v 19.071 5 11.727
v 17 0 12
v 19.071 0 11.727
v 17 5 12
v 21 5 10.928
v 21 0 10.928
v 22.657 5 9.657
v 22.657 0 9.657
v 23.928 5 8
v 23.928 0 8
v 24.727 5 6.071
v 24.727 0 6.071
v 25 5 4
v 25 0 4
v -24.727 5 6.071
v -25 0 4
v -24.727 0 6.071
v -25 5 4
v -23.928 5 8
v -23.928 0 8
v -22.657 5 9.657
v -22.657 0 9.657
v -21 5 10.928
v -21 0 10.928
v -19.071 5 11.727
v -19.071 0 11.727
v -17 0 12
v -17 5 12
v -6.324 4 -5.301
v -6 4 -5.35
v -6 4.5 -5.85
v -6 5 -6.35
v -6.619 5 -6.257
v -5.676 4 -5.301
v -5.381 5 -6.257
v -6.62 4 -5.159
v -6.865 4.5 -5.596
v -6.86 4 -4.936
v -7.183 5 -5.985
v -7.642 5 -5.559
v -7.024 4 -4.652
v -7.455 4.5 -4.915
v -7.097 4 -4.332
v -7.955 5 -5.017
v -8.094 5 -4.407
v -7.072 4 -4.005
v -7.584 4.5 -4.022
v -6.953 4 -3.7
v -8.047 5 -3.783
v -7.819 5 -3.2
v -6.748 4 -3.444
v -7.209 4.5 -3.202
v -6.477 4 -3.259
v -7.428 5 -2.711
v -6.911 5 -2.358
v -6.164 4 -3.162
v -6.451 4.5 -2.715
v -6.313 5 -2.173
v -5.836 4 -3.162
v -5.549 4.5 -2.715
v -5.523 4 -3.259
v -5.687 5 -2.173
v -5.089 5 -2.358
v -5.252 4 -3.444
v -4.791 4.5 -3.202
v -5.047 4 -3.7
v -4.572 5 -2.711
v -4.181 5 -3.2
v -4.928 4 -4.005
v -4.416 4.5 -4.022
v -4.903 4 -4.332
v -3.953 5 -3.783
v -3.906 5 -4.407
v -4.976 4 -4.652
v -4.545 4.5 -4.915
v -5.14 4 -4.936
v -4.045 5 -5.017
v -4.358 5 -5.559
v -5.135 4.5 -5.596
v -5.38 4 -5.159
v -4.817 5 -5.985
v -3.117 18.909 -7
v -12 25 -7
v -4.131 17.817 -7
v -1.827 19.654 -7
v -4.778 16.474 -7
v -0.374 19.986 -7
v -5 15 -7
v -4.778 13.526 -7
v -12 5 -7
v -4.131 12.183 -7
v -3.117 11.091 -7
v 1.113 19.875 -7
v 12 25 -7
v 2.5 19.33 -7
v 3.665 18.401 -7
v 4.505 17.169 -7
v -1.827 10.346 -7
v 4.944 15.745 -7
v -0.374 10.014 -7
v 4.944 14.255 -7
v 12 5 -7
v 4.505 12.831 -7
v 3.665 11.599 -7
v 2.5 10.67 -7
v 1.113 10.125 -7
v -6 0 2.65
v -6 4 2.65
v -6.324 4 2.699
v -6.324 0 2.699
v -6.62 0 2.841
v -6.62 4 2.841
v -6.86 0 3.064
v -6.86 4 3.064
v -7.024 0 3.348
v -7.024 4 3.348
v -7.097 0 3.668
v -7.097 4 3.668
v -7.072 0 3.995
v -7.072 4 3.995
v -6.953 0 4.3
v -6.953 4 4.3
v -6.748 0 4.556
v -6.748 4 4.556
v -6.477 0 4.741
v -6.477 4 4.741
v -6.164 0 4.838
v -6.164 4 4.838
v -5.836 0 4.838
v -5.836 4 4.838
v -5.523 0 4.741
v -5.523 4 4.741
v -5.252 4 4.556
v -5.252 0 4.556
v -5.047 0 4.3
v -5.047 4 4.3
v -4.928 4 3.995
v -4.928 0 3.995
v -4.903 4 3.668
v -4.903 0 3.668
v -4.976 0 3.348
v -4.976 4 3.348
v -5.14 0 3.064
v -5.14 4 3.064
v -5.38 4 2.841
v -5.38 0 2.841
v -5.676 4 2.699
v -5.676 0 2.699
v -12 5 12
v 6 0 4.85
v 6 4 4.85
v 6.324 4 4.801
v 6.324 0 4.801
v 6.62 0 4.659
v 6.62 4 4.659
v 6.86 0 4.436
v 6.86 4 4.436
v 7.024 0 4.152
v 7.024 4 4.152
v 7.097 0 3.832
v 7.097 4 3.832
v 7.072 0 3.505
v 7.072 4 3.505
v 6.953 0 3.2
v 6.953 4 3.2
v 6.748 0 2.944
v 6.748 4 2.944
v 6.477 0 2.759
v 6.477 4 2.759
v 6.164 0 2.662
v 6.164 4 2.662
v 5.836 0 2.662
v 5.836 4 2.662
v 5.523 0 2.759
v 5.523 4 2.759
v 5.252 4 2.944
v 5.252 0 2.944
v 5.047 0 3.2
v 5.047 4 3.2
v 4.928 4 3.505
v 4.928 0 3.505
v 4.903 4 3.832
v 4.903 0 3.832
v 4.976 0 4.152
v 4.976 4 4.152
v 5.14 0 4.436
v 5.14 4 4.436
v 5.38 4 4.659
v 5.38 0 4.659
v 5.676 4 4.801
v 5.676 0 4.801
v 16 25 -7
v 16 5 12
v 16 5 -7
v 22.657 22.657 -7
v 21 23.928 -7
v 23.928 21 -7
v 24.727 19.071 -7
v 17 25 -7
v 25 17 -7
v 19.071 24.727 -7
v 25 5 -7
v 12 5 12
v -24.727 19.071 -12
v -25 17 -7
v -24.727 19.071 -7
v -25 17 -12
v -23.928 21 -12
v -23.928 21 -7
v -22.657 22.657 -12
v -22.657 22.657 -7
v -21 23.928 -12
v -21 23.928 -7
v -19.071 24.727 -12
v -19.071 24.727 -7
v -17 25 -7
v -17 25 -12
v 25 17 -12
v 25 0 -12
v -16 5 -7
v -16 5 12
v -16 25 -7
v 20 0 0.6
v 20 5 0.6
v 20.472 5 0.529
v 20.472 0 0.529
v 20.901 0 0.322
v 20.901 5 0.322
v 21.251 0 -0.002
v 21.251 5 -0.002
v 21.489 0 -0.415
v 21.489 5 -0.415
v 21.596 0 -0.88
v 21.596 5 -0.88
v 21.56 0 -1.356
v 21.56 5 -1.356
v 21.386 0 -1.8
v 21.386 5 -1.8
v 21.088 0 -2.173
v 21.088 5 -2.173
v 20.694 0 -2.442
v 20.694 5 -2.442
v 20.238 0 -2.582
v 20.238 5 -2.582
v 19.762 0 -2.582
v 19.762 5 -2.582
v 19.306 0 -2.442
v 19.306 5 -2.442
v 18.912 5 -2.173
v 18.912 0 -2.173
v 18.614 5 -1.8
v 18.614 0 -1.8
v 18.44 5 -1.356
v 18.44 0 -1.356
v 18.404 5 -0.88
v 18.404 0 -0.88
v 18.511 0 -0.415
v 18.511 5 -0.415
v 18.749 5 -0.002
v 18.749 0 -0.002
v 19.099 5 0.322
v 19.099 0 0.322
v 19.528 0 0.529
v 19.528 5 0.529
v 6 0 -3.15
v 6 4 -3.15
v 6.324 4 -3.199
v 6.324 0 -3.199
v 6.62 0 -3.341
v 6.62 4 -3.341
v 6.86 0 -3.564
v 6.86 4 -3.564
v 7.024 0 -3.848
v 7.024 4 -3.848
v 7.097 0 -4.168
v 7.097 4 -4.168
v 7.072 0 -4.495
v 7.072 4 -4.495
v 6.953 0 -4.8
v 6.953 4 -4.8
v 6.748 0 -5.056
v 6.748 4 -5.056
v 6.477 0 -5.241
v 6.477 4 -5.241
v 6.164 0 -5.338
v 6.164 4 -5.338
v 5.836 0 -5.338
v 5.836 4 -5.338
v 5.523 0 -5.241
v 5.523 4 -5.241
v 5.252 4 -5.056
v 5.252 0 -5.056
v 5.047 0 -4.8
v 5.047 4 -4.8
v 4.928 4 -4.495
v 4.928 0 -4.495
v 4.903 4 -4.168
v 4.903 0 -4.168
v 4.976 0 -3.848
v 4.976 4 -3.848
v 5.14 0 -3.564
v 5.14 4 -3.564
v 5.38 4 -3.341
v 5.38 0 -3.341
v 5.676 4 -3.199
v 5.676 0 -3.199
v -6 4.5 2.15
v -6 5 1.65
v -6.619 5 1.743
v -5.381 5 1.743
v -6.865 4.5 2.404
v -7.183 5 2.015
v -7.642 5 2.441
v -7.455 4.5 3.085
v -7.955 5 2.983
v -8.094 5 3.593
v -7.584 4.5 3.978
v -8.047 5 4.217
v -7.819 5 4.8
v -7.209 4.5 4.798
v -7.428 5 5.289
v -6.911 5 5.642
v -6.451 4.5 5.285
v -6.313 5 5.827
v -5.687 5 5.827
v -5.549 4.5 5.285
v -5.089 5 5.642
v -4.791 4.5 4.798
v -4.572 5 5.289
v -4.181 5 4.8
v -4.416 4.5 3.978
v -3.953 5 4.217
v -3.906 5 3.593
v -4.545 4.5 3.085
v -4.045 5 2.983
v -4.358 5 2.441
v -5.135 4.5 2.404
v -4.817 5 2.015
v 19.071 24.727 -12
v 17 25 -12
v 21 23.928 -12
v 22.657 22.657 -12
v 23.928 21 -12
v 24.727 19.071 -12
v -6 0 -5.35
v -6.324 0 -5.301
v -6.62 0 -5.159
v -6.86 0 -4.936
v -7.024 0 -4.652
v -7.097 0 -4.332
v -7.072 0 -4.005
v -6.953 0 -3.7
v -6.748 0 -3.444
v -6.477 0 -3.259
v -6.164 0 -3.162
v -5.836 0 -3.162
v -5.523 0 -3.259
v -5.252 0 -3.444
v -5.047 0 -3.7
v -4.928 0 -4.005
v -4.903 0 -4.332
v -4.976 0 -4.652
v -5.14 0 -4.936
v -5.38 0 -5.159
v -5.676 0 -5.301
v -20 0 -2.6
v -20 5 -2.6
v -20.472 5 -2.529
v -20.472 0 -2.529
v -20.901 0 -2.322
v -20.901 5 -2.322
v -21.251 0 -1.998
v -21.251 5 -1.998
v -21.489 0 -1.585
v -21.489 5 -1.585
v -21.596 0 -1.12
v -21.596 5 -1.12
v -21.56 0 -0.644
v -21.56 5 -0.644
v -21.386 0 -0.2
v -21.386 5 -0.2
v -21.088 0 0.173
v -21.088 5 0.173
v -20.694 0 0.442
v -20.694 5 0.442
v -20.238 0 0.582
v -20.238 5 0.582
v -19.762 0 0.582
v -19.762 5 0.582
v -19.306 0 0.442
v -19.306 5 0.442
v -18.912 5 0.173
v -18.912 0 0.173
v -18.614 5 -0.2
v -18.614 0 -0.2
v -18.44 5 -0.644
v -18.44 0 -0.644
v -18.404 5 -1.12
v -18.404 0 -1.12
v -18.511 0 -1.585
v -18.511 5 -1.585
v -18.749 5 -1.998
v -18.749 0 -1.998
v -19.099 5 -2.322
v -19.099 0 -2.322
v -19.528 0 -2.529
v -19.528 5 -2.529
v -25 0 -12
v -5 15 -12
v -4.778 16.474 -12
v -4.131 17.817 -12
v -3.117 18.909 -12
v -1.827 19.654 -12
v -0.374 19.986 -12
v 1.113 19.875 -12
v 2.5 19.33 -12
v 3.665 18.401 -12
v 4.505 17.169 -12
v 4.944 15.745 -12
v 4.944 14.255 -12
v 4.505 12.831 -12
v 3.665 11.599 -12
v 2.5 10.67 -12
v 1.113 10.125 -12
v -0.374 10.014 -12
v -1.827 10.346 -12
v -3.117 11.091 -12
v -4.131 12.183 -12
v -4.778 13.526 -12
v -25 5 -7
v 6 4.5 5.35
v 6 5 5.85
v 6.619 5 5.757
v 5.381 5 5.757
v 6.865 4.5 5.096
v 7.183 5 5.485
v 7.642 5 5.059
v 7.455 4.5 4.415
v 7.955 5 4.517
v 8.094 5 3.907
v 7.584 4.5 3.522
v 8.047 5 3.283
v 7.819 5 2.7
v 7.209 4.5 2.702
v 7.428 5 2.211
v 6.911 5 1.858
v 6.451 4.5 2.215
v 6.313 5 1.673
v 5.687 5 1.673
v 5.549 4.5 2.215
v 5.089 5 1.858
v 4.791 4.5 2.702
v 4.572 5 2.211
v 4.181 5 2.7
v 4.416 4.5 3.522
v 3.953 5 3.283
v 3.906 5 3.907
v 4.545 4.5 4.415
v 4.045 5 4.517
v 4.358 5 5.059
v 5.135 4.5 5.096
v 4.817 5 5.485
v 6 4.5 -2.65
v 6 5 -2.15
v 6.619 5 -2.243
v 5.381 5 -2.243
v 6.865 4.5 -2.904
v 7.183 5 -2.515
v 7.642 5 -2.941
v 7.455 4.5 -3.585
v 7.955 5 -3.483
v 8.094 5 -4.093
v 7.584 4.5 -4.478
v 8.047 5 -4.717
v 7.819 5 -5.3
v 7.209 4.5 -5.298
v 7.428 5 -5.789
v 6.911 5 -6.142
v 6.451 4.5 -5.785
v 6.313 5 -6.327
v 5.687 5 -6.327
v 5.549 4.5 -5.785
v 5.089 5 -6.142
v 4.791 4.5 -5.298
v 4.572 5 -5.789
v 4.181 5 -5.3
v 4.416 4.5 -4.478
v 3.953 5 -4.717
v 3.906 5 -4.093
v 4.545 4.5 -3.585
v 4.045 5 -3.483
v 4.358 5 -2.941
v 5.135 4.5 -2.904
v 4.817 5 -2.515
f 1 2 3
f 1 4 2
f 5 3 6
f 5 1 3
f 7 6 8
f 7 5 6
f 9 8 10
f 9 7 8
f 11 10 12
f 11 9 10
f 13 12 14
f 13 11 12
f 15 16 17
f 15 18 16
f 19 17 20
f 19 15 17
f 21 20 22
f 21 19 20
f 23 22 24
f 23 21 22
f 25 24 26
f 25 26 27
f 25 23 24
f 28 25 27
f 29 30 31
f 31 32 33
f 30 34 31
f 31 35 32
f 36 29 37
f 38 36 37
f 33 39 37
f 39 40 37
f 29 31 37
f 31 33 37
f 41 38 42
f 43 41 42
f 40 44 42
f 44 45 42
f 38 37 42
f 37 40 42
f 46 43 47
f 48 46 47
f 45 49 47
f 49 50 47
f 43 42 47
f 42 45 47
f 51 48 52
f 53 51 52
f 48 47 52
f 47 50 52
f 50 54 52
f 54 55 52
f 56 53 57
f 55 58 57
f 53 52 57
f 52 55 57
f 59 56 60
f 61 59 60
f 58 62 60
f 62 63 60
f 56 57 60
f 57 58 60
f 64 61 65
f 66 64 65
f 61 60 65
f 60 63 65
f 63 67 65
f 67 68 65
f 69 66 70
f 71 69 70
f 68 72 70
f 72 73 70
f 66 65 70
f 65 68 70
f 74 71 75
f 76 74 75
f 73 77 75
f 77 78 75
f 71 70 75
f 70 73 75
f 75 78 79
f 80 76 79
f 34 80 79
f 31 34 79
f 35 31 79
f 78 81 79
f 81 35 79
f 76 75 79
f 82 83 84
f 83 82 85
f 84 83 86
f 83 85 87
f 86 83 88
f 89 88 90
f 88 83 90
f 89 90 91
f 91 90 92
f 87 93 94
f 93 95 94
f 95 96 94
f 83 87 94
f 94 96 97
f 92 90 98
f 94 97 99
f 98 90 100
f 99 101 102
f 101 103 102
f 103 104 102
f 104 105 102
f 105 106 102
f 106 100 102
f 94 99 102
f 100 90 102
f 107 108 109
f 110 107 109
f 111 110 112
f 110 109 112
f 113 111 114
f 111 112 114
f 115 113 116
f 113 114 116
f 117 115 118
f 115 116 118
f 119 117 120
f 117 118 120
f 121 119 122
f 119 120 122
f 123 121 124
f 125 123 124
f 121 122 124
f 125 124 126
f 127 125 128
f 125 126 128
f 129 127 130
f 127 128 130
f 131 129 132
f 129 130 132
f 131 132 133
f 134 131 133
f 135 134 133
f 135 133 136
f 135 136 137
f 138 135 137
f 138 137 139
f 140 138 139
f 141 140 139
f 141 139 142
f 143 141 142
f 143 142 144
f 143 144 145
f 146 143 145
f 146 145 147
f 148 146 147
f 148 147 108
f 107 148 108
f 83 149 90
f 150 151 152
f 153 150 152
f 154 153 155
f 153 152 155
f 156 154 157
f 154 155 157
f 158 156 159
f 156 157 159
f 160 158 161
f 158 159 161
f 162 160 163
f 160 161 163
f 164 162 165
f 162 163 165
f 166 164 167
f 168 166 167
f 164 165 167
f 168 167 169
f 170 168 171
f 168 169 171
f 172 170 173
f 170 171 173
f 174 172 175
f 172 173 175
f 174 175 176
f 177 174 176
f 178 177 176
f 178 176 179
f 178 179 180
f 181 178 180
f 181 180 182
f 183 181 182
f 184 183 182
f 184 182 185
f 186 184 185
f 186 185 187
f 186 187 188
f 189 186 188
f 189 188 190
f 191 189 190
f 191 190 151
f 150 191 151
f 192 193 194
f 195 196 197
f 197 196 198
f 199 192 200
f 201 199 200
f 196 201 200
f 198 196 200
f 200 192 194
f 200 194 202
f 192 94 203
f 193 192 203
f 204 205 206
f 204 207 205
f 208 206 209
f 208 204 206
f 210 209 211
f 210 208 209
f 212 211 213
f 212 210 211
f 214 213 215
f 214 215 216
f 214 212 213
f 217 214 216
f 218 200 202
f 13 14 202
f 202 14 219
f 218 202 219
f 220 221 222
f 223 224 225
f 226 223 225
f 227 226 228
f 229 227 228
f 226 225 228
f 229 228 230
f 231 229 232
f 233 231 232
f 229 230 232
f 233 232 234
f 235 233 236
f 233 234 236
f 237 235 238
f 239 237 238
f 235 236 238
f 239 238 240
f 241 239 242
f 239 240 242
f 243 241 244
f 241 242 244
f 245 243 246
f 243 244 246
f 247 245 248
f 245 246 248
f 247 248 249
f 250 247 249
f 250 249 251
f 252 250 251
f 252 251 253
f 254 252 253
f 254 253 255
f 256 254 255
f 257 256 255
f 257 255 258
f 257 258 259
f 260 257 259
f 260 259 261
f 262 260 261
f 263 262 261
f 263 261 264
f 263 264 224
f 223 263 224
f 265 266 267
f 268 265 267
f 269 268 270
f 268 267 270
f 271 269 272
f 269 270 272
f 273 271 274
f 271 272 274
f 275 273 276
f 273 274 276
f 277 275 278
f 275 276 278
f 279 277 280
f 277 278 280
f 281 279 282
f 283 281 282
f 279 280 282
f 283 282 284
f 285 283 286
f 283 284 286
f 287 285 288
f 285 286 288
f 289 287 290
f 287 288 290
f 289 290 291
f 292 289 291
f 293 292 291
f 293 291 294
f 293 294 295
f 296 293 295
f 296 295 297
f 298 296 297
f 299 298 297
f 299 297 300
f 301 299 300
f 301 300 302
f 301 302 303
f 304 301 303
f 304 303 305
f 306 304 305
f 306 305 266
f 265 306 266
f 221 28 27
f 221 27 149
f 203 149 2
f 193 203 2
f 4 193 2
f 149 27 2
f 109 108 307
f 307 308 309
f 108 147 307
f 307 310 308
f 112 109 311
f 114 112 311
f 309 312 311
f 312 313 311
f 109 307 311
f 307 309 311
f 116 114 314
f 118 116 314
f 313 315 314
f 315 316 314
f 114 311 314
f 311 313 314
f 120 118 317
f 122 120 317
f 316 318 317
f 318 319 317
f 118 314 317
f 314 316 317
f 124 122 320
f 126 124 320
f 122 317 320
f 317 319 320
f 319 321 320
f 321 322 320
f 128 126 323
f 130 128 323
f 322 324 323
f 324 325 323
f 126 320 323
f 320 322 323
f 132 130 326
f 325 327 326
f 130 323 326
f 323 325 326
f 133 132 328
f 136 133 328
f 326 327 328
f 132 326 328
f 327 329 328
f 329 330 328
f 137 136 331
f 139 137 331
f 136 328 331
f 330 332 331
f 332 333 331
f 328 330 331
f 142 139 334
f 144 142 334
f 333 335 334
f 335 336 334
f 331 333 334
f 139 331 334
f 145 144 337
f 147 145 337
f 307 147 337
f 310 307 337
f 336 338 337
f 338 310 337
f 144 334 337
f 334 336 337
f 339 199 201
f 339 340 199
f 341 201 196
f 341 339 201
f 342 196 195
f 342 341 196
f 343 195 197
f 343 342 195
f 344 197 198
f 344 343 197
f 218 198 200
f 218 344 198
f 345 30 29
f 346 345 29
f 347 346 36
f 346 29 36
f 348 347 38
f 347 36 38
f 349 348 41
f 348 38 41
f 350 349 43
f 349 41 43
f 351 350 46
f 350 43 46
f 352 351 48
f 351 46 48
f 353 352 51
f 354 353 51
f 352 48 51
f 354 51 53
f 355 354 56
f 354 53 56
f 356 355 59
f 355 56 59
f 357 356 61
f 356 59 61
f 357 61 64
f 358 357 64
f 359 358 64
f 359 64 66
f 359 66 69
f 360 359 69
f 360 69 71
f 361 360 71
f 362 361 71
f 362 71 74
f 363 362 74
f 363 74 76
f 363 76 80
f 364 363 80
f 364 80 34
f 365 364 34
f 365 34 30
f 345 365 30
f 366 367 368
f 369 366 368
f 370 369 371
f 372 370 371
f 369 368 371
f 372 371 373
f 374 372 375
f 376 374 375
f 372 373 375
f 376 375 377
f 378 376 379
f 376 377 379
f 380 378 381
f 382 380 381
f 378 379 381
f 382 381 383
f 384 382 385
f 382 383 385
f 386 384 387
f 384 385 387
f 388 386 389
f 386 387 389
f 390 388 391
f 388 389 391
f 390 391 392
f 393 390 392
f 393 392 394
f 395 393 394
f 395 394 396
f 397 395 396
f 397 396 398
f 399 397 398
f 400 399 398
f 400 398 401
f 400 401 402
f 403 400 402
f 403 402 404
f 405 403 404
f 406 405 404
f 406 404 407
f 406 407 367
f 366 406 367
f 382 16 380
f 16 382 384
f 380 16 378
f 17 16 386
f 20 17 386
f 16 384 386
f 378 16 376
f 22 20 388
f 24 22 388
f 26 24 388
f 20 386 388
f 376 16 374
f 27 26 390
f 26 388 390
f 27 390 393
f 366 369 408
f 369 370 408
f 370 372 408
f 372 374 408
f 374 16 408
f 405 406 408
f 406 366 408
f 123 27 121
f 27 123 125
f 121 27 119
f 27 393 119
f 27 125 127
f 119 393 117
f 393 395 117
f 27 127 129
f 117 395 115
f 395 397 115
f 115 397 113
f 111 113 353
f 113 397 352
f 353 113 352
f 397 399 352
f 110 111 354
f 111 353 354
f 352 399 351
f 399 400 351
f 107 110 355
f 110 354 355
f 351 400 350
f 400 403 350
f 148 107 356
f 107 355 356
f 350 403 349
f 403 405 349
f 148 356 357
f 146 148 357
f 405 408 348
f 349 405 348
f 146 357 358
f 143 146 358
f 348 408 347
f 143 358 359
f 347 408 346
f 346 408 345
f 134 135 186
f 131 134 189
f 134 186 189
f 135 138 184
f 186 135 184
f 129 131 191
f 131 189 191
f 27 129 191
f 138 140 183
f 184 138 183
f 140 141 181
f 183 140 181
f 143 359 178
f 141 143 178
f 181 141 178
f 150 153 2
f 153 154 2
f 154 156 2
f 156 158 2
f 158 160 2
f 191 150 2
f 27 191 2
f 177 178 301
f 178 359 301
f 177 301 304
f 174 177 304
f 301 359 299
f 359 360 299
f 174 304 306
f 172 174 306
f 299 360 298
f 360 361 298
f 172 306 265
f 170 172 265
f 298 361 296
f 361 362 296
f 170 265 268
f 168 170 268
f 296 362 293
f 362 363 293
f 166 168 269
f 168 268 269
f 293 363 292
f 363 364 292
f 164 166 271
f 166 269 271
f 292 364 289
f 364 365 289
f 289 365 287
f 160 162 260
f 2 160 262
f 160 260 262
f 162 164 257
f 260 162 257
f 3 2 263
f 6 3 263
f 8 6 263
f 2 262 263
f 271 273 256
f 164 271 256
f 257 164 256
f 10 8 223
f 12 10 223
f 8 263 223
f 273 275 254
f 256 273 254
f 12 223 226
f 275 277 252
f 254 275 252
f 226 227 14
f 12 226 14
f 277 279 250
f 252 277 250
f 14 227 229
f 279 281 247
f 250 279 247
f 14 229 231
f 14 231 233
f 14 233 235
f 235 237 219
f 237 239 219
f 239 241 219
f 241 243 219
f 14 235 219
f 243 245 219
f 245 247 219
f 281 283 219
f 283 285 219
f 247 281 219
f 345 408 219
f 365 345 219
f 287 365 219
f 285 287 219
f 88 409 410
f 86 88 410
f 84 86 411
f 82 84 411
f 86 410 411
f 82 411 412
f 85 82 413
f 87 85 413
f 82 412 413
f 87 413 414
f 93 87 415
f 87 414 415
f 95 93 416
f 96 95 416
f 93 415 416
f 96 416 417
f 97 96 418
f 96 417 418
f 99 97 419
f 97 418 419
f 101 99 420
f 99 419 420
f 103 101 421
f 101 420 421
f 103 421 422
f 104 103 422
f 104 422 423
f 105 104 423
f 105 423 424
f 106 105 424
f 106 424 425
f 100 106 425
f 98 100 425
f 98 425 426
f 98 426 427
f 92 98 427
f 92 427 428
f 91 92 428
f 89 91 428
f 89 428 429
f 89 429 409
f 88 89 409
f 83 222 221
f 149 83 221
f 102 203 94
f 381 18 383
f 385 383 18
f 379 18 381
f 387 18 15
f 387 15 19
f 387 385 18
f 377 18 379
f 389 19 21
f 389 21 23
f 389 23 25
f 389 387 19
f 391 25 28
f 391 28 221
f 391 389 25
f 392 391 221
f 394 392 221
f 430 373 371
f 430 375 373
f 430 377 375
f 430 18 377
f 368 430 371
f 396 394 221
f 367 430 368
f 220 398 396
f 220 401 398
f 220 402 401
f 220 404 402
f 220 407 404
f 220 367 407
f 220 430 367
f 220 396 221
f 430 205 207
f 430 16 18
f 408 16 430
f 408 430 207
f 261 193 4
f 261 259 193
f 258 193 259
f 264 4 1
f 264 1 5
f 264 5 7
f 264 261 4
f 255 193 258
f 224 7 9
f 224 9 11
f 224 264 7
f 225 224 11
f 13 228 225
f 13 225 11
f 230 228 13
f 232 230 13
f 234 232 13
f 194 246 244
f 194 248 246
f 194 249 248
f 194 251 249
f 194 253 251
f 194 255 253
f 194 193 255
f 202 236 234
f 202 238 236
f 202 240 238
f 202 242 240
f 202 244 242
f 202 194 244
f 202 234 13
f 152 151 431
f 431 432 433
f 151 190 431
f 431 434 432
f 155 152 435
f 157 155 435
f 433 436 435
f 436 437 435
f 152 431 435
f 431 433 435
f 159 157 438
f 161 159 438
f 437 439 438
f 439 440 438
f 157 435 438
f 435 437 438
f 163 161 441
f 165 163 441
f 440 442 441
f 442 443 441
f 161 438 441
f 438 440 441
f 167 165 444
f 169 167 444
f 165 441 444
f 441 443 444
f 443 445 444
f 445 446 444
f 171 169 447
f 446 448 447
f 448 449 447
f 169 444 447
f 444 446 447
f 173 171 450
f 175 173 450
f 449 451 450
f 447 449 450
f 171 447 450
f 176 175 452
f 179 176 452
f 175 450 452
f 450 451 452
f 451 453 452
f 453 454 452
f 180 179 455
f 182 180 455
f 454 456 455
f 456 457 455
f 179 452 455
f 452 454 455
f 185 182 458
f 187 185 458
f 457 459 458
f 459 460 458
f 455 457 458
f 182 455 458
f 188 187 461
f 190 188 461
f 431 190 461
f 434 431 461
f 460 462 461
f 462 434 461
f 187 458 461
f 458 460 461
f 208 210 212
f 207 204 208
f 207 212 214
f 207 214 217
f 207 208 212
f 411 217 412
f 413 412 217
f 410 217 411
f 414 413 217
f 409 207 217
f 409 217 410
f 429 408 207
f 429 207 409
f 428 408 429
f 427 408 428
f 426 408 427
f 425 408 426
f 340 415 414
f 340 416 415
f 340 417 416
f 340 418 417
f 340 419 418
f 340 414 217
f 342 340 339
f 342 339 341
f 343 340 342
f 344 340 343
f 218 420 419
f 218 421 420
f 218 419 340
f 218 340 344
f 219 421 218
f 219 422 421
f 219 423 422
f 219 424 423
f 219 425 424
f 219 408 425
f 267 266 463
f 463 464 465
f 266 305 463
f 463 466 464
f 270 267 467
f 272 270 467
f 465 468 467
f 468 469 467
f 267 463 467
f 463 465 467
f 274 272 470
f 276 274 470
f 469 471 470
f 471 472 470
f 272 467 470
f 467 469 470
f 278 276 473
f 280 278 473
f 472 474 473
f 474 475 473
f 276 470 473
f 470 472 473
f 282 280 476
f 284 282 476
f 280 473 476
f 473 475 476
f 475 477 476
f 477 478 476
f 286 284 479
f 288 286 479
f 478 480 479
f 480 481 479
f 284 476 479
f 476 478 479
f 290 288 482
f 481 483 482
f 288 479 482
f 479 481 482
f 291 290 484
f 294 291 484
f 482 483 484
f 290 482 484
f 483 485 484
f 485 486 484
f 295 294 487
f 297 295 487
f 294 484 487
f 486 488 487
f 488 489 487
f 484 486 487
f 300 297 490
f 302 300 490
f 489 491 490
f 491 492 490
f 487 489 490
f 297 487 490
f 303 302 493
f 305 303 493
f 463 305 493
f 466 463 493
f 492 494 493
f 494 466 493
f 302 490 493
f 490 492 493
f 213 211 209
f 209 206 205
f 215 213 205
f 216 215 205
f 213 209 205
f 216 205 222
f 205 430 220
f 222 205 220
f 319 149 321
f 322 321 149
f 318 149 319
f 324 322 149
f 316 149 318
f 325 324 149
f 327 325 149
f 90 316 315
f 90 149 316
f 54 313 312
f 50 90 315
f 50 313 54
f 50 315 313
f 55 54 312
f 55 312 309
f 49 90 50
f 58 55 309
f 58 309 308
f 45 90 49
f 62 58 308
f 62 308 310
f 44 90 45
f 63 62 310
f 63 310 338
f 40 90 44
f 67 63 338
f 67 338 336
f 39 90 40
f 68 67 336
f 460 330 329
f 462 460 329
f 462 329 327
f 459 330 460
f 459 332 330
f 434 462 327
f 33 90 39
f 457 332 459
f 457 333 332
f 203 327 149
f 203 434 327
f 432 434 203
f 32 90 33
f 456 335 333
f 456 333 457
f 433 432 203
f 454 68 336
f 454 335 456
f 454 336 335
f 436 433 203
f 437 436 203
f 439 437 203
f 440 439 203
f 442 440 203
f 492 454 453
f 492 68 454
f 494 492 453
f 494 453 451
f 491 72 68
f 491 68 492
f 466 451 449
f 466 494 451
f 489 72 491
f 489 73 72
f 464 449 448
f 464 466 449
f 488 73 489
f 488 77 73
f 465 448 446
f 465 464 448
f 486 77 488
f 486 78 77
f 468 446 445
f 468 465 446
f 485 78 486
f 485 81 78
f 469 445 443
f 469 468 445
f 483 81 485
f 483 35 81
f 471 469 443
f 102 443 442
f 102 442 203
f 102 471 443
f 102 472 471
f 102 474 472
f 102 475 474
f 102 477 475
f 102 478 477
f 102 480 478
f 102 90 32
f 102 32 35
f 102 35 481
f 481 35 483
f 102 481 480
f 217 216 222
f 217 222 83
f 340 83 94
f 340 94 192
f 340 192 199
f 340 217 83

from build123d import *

# Parameters (mm, degrees)
SKETCH_1_W          = 50
SKETCH_1_H          = 24
EXTRUDE_1_DEPTH     = 5
SKETCH_2_W          = 50
SKETCH_2_H          = 5
EXTRUDE_2_DEPTH     = 20
SKETCH_3_W          = 4
SKETCH_3_H          = 19
EXTRUDE_3_DEPTH     = 20
CUT_EXTRUDE_1_DEPTH = 50.497474683
SKETCH_6_R          = 1.1
CUT_EXTRUDE_2_DEPTH = 35.190641995
SKETCH_7_R          = 5
CUT_EXTRUDE_3_DEPTH = 43.731721238
SKETCH_8_R          = 1.6
CUT_EXTRUDE_4_DEPTH = 35.190641995
FILLET_1_R          = 8
CHAMFER_1_SIZE      = 1


with BuildPart() as part:
    # 草图1 → 凸台-拉伸1 (new body)
    with BuildSketch(Plane(origin=(0, 0, 0), x_dir=(1, 0, 0), z_dir=(0, 1, 0))):
        Rectangle(SKETCH_1_W, SKETCH_1_H)
    extrude(amount=EXTRUDE_1_DEPTH)

    # 草图2 → 凸台-拉伸2 (add)
    with BuildSketch(Plane(origin=(0, 5, 0), x_dir=(1, 0, 0), z_dir=(0, 1, 0))):
        with Locations((0, 9.5)):
            Rectangle(SKETCH_2_W, SKETCH_2_H)
    extrude(amount=EXTRUDE_2_DEPTH)

    # 草图3 → 凸台-拉伸3 (add)
    with BuildSketch(Plane(origin=(0, 5, 0), x_dir=(1, 0, 0), z_dir=(0, 1, 0))):
        with Locations((14, -2.5)):
            Rectangle(SKETCH_3_W, SKETCH_3_H)
        with Locations((-14, -2.5)):
            Rectangle(SKETCH_3_W, SKETCH_3_H)
    extrude(amount=EXTRUDE_3_DEPTH)

    # 草图4 → 切除-拉伸1 (cut, through all)
    with BuildSketch(Plane.ZY.offset(16)):
        Polygon((-7, 25), (12, 5), (12, 25), align=None)
    extrude(amount=-CUT_EXTRUDE_1_DEPTH, mode=Mode.SUBTRACT)

    # 草图6 → 切除-拉伸2 (cut, through all)
    with BuildSketch(Plane(origin=(0, 5, 0), x_dir=(1, 0, 0), z_dir=(0, 1, 0))):
        with Locations(Location((6, 4.25, 0), (0, 0, 270))):
            Circle(SKETCH_6_R)
        with Locations(Location((6, -3.75, 0), (0, 0, 270))):
            Circle(SKETCH_6_R)
        with Locations(Location((-6, 4.25, 0), (0, 0, 90))):
            Circle(SKETCH_6_R)
        with Locations(Location((-6, -3.75, 0), (0, 0, 90))):
            Circle(SKETCH_6_R)
    extrude(amount=-CUT_EXTRUDE_2_DEPTH, mode=Mode.SUBTRACT)

    # 草图7 → 切除-拉伸3 (cut, through all)
    with BuildSketch(Plane(origin=(0, 0, -12), x_dir=(-1, 0, 0), z_dir=(0, 0, -1))):
        with Locations((0, 15)):
            Circle(SKETCH_7_R)
    extrude(amount=-CUT_EXTRUDE_3_DEPTH, mode=Mode.SUBTRACT)

    # 草图8 → 切除-拉伸4 (cut, through all)
    with BuildSketch(Plane(origin=(0, 5, 0), x_dir=(1, 0, 0), z_dir=(0, 1, 0))):
        with Locations(Location((20, 1, 0), (0, 0, 270))):
            Circle(SKETCH_8_R)
        with Locations(Location((-20, 1, 0), (0, 0, 90))):
            Circle(SKETCH_8_R)
    extrude(amount=-CUT_EXTRUDE_4_DEPTH, mode=Mode.SUBTRACT)

    # 圆角1
    fillet_1_edges = [part.edges().sort_by_distance(p)[0] for p in [
        (-25, 25, -9.5),
        (25, 25, -9.5),
        (25, 2.5, 12),
        (-25, 2.5, 12),
    ]]
    fillet(fillet_1_edges, radius=FILLET_1_R)

    # 倒角1
    chamfer_1_edges = [part.edges().sort_by_distance(p)[0] for p in [
        (6, 5, 2.65),
        (-6, 5, -3.15),
        (-6, 5, 4.85),
        (6, 5, -5.35),
    ]]
    chamfer(chamfer_1_edges, length=CHAMFER_1_SIZE)


solid = part.part
